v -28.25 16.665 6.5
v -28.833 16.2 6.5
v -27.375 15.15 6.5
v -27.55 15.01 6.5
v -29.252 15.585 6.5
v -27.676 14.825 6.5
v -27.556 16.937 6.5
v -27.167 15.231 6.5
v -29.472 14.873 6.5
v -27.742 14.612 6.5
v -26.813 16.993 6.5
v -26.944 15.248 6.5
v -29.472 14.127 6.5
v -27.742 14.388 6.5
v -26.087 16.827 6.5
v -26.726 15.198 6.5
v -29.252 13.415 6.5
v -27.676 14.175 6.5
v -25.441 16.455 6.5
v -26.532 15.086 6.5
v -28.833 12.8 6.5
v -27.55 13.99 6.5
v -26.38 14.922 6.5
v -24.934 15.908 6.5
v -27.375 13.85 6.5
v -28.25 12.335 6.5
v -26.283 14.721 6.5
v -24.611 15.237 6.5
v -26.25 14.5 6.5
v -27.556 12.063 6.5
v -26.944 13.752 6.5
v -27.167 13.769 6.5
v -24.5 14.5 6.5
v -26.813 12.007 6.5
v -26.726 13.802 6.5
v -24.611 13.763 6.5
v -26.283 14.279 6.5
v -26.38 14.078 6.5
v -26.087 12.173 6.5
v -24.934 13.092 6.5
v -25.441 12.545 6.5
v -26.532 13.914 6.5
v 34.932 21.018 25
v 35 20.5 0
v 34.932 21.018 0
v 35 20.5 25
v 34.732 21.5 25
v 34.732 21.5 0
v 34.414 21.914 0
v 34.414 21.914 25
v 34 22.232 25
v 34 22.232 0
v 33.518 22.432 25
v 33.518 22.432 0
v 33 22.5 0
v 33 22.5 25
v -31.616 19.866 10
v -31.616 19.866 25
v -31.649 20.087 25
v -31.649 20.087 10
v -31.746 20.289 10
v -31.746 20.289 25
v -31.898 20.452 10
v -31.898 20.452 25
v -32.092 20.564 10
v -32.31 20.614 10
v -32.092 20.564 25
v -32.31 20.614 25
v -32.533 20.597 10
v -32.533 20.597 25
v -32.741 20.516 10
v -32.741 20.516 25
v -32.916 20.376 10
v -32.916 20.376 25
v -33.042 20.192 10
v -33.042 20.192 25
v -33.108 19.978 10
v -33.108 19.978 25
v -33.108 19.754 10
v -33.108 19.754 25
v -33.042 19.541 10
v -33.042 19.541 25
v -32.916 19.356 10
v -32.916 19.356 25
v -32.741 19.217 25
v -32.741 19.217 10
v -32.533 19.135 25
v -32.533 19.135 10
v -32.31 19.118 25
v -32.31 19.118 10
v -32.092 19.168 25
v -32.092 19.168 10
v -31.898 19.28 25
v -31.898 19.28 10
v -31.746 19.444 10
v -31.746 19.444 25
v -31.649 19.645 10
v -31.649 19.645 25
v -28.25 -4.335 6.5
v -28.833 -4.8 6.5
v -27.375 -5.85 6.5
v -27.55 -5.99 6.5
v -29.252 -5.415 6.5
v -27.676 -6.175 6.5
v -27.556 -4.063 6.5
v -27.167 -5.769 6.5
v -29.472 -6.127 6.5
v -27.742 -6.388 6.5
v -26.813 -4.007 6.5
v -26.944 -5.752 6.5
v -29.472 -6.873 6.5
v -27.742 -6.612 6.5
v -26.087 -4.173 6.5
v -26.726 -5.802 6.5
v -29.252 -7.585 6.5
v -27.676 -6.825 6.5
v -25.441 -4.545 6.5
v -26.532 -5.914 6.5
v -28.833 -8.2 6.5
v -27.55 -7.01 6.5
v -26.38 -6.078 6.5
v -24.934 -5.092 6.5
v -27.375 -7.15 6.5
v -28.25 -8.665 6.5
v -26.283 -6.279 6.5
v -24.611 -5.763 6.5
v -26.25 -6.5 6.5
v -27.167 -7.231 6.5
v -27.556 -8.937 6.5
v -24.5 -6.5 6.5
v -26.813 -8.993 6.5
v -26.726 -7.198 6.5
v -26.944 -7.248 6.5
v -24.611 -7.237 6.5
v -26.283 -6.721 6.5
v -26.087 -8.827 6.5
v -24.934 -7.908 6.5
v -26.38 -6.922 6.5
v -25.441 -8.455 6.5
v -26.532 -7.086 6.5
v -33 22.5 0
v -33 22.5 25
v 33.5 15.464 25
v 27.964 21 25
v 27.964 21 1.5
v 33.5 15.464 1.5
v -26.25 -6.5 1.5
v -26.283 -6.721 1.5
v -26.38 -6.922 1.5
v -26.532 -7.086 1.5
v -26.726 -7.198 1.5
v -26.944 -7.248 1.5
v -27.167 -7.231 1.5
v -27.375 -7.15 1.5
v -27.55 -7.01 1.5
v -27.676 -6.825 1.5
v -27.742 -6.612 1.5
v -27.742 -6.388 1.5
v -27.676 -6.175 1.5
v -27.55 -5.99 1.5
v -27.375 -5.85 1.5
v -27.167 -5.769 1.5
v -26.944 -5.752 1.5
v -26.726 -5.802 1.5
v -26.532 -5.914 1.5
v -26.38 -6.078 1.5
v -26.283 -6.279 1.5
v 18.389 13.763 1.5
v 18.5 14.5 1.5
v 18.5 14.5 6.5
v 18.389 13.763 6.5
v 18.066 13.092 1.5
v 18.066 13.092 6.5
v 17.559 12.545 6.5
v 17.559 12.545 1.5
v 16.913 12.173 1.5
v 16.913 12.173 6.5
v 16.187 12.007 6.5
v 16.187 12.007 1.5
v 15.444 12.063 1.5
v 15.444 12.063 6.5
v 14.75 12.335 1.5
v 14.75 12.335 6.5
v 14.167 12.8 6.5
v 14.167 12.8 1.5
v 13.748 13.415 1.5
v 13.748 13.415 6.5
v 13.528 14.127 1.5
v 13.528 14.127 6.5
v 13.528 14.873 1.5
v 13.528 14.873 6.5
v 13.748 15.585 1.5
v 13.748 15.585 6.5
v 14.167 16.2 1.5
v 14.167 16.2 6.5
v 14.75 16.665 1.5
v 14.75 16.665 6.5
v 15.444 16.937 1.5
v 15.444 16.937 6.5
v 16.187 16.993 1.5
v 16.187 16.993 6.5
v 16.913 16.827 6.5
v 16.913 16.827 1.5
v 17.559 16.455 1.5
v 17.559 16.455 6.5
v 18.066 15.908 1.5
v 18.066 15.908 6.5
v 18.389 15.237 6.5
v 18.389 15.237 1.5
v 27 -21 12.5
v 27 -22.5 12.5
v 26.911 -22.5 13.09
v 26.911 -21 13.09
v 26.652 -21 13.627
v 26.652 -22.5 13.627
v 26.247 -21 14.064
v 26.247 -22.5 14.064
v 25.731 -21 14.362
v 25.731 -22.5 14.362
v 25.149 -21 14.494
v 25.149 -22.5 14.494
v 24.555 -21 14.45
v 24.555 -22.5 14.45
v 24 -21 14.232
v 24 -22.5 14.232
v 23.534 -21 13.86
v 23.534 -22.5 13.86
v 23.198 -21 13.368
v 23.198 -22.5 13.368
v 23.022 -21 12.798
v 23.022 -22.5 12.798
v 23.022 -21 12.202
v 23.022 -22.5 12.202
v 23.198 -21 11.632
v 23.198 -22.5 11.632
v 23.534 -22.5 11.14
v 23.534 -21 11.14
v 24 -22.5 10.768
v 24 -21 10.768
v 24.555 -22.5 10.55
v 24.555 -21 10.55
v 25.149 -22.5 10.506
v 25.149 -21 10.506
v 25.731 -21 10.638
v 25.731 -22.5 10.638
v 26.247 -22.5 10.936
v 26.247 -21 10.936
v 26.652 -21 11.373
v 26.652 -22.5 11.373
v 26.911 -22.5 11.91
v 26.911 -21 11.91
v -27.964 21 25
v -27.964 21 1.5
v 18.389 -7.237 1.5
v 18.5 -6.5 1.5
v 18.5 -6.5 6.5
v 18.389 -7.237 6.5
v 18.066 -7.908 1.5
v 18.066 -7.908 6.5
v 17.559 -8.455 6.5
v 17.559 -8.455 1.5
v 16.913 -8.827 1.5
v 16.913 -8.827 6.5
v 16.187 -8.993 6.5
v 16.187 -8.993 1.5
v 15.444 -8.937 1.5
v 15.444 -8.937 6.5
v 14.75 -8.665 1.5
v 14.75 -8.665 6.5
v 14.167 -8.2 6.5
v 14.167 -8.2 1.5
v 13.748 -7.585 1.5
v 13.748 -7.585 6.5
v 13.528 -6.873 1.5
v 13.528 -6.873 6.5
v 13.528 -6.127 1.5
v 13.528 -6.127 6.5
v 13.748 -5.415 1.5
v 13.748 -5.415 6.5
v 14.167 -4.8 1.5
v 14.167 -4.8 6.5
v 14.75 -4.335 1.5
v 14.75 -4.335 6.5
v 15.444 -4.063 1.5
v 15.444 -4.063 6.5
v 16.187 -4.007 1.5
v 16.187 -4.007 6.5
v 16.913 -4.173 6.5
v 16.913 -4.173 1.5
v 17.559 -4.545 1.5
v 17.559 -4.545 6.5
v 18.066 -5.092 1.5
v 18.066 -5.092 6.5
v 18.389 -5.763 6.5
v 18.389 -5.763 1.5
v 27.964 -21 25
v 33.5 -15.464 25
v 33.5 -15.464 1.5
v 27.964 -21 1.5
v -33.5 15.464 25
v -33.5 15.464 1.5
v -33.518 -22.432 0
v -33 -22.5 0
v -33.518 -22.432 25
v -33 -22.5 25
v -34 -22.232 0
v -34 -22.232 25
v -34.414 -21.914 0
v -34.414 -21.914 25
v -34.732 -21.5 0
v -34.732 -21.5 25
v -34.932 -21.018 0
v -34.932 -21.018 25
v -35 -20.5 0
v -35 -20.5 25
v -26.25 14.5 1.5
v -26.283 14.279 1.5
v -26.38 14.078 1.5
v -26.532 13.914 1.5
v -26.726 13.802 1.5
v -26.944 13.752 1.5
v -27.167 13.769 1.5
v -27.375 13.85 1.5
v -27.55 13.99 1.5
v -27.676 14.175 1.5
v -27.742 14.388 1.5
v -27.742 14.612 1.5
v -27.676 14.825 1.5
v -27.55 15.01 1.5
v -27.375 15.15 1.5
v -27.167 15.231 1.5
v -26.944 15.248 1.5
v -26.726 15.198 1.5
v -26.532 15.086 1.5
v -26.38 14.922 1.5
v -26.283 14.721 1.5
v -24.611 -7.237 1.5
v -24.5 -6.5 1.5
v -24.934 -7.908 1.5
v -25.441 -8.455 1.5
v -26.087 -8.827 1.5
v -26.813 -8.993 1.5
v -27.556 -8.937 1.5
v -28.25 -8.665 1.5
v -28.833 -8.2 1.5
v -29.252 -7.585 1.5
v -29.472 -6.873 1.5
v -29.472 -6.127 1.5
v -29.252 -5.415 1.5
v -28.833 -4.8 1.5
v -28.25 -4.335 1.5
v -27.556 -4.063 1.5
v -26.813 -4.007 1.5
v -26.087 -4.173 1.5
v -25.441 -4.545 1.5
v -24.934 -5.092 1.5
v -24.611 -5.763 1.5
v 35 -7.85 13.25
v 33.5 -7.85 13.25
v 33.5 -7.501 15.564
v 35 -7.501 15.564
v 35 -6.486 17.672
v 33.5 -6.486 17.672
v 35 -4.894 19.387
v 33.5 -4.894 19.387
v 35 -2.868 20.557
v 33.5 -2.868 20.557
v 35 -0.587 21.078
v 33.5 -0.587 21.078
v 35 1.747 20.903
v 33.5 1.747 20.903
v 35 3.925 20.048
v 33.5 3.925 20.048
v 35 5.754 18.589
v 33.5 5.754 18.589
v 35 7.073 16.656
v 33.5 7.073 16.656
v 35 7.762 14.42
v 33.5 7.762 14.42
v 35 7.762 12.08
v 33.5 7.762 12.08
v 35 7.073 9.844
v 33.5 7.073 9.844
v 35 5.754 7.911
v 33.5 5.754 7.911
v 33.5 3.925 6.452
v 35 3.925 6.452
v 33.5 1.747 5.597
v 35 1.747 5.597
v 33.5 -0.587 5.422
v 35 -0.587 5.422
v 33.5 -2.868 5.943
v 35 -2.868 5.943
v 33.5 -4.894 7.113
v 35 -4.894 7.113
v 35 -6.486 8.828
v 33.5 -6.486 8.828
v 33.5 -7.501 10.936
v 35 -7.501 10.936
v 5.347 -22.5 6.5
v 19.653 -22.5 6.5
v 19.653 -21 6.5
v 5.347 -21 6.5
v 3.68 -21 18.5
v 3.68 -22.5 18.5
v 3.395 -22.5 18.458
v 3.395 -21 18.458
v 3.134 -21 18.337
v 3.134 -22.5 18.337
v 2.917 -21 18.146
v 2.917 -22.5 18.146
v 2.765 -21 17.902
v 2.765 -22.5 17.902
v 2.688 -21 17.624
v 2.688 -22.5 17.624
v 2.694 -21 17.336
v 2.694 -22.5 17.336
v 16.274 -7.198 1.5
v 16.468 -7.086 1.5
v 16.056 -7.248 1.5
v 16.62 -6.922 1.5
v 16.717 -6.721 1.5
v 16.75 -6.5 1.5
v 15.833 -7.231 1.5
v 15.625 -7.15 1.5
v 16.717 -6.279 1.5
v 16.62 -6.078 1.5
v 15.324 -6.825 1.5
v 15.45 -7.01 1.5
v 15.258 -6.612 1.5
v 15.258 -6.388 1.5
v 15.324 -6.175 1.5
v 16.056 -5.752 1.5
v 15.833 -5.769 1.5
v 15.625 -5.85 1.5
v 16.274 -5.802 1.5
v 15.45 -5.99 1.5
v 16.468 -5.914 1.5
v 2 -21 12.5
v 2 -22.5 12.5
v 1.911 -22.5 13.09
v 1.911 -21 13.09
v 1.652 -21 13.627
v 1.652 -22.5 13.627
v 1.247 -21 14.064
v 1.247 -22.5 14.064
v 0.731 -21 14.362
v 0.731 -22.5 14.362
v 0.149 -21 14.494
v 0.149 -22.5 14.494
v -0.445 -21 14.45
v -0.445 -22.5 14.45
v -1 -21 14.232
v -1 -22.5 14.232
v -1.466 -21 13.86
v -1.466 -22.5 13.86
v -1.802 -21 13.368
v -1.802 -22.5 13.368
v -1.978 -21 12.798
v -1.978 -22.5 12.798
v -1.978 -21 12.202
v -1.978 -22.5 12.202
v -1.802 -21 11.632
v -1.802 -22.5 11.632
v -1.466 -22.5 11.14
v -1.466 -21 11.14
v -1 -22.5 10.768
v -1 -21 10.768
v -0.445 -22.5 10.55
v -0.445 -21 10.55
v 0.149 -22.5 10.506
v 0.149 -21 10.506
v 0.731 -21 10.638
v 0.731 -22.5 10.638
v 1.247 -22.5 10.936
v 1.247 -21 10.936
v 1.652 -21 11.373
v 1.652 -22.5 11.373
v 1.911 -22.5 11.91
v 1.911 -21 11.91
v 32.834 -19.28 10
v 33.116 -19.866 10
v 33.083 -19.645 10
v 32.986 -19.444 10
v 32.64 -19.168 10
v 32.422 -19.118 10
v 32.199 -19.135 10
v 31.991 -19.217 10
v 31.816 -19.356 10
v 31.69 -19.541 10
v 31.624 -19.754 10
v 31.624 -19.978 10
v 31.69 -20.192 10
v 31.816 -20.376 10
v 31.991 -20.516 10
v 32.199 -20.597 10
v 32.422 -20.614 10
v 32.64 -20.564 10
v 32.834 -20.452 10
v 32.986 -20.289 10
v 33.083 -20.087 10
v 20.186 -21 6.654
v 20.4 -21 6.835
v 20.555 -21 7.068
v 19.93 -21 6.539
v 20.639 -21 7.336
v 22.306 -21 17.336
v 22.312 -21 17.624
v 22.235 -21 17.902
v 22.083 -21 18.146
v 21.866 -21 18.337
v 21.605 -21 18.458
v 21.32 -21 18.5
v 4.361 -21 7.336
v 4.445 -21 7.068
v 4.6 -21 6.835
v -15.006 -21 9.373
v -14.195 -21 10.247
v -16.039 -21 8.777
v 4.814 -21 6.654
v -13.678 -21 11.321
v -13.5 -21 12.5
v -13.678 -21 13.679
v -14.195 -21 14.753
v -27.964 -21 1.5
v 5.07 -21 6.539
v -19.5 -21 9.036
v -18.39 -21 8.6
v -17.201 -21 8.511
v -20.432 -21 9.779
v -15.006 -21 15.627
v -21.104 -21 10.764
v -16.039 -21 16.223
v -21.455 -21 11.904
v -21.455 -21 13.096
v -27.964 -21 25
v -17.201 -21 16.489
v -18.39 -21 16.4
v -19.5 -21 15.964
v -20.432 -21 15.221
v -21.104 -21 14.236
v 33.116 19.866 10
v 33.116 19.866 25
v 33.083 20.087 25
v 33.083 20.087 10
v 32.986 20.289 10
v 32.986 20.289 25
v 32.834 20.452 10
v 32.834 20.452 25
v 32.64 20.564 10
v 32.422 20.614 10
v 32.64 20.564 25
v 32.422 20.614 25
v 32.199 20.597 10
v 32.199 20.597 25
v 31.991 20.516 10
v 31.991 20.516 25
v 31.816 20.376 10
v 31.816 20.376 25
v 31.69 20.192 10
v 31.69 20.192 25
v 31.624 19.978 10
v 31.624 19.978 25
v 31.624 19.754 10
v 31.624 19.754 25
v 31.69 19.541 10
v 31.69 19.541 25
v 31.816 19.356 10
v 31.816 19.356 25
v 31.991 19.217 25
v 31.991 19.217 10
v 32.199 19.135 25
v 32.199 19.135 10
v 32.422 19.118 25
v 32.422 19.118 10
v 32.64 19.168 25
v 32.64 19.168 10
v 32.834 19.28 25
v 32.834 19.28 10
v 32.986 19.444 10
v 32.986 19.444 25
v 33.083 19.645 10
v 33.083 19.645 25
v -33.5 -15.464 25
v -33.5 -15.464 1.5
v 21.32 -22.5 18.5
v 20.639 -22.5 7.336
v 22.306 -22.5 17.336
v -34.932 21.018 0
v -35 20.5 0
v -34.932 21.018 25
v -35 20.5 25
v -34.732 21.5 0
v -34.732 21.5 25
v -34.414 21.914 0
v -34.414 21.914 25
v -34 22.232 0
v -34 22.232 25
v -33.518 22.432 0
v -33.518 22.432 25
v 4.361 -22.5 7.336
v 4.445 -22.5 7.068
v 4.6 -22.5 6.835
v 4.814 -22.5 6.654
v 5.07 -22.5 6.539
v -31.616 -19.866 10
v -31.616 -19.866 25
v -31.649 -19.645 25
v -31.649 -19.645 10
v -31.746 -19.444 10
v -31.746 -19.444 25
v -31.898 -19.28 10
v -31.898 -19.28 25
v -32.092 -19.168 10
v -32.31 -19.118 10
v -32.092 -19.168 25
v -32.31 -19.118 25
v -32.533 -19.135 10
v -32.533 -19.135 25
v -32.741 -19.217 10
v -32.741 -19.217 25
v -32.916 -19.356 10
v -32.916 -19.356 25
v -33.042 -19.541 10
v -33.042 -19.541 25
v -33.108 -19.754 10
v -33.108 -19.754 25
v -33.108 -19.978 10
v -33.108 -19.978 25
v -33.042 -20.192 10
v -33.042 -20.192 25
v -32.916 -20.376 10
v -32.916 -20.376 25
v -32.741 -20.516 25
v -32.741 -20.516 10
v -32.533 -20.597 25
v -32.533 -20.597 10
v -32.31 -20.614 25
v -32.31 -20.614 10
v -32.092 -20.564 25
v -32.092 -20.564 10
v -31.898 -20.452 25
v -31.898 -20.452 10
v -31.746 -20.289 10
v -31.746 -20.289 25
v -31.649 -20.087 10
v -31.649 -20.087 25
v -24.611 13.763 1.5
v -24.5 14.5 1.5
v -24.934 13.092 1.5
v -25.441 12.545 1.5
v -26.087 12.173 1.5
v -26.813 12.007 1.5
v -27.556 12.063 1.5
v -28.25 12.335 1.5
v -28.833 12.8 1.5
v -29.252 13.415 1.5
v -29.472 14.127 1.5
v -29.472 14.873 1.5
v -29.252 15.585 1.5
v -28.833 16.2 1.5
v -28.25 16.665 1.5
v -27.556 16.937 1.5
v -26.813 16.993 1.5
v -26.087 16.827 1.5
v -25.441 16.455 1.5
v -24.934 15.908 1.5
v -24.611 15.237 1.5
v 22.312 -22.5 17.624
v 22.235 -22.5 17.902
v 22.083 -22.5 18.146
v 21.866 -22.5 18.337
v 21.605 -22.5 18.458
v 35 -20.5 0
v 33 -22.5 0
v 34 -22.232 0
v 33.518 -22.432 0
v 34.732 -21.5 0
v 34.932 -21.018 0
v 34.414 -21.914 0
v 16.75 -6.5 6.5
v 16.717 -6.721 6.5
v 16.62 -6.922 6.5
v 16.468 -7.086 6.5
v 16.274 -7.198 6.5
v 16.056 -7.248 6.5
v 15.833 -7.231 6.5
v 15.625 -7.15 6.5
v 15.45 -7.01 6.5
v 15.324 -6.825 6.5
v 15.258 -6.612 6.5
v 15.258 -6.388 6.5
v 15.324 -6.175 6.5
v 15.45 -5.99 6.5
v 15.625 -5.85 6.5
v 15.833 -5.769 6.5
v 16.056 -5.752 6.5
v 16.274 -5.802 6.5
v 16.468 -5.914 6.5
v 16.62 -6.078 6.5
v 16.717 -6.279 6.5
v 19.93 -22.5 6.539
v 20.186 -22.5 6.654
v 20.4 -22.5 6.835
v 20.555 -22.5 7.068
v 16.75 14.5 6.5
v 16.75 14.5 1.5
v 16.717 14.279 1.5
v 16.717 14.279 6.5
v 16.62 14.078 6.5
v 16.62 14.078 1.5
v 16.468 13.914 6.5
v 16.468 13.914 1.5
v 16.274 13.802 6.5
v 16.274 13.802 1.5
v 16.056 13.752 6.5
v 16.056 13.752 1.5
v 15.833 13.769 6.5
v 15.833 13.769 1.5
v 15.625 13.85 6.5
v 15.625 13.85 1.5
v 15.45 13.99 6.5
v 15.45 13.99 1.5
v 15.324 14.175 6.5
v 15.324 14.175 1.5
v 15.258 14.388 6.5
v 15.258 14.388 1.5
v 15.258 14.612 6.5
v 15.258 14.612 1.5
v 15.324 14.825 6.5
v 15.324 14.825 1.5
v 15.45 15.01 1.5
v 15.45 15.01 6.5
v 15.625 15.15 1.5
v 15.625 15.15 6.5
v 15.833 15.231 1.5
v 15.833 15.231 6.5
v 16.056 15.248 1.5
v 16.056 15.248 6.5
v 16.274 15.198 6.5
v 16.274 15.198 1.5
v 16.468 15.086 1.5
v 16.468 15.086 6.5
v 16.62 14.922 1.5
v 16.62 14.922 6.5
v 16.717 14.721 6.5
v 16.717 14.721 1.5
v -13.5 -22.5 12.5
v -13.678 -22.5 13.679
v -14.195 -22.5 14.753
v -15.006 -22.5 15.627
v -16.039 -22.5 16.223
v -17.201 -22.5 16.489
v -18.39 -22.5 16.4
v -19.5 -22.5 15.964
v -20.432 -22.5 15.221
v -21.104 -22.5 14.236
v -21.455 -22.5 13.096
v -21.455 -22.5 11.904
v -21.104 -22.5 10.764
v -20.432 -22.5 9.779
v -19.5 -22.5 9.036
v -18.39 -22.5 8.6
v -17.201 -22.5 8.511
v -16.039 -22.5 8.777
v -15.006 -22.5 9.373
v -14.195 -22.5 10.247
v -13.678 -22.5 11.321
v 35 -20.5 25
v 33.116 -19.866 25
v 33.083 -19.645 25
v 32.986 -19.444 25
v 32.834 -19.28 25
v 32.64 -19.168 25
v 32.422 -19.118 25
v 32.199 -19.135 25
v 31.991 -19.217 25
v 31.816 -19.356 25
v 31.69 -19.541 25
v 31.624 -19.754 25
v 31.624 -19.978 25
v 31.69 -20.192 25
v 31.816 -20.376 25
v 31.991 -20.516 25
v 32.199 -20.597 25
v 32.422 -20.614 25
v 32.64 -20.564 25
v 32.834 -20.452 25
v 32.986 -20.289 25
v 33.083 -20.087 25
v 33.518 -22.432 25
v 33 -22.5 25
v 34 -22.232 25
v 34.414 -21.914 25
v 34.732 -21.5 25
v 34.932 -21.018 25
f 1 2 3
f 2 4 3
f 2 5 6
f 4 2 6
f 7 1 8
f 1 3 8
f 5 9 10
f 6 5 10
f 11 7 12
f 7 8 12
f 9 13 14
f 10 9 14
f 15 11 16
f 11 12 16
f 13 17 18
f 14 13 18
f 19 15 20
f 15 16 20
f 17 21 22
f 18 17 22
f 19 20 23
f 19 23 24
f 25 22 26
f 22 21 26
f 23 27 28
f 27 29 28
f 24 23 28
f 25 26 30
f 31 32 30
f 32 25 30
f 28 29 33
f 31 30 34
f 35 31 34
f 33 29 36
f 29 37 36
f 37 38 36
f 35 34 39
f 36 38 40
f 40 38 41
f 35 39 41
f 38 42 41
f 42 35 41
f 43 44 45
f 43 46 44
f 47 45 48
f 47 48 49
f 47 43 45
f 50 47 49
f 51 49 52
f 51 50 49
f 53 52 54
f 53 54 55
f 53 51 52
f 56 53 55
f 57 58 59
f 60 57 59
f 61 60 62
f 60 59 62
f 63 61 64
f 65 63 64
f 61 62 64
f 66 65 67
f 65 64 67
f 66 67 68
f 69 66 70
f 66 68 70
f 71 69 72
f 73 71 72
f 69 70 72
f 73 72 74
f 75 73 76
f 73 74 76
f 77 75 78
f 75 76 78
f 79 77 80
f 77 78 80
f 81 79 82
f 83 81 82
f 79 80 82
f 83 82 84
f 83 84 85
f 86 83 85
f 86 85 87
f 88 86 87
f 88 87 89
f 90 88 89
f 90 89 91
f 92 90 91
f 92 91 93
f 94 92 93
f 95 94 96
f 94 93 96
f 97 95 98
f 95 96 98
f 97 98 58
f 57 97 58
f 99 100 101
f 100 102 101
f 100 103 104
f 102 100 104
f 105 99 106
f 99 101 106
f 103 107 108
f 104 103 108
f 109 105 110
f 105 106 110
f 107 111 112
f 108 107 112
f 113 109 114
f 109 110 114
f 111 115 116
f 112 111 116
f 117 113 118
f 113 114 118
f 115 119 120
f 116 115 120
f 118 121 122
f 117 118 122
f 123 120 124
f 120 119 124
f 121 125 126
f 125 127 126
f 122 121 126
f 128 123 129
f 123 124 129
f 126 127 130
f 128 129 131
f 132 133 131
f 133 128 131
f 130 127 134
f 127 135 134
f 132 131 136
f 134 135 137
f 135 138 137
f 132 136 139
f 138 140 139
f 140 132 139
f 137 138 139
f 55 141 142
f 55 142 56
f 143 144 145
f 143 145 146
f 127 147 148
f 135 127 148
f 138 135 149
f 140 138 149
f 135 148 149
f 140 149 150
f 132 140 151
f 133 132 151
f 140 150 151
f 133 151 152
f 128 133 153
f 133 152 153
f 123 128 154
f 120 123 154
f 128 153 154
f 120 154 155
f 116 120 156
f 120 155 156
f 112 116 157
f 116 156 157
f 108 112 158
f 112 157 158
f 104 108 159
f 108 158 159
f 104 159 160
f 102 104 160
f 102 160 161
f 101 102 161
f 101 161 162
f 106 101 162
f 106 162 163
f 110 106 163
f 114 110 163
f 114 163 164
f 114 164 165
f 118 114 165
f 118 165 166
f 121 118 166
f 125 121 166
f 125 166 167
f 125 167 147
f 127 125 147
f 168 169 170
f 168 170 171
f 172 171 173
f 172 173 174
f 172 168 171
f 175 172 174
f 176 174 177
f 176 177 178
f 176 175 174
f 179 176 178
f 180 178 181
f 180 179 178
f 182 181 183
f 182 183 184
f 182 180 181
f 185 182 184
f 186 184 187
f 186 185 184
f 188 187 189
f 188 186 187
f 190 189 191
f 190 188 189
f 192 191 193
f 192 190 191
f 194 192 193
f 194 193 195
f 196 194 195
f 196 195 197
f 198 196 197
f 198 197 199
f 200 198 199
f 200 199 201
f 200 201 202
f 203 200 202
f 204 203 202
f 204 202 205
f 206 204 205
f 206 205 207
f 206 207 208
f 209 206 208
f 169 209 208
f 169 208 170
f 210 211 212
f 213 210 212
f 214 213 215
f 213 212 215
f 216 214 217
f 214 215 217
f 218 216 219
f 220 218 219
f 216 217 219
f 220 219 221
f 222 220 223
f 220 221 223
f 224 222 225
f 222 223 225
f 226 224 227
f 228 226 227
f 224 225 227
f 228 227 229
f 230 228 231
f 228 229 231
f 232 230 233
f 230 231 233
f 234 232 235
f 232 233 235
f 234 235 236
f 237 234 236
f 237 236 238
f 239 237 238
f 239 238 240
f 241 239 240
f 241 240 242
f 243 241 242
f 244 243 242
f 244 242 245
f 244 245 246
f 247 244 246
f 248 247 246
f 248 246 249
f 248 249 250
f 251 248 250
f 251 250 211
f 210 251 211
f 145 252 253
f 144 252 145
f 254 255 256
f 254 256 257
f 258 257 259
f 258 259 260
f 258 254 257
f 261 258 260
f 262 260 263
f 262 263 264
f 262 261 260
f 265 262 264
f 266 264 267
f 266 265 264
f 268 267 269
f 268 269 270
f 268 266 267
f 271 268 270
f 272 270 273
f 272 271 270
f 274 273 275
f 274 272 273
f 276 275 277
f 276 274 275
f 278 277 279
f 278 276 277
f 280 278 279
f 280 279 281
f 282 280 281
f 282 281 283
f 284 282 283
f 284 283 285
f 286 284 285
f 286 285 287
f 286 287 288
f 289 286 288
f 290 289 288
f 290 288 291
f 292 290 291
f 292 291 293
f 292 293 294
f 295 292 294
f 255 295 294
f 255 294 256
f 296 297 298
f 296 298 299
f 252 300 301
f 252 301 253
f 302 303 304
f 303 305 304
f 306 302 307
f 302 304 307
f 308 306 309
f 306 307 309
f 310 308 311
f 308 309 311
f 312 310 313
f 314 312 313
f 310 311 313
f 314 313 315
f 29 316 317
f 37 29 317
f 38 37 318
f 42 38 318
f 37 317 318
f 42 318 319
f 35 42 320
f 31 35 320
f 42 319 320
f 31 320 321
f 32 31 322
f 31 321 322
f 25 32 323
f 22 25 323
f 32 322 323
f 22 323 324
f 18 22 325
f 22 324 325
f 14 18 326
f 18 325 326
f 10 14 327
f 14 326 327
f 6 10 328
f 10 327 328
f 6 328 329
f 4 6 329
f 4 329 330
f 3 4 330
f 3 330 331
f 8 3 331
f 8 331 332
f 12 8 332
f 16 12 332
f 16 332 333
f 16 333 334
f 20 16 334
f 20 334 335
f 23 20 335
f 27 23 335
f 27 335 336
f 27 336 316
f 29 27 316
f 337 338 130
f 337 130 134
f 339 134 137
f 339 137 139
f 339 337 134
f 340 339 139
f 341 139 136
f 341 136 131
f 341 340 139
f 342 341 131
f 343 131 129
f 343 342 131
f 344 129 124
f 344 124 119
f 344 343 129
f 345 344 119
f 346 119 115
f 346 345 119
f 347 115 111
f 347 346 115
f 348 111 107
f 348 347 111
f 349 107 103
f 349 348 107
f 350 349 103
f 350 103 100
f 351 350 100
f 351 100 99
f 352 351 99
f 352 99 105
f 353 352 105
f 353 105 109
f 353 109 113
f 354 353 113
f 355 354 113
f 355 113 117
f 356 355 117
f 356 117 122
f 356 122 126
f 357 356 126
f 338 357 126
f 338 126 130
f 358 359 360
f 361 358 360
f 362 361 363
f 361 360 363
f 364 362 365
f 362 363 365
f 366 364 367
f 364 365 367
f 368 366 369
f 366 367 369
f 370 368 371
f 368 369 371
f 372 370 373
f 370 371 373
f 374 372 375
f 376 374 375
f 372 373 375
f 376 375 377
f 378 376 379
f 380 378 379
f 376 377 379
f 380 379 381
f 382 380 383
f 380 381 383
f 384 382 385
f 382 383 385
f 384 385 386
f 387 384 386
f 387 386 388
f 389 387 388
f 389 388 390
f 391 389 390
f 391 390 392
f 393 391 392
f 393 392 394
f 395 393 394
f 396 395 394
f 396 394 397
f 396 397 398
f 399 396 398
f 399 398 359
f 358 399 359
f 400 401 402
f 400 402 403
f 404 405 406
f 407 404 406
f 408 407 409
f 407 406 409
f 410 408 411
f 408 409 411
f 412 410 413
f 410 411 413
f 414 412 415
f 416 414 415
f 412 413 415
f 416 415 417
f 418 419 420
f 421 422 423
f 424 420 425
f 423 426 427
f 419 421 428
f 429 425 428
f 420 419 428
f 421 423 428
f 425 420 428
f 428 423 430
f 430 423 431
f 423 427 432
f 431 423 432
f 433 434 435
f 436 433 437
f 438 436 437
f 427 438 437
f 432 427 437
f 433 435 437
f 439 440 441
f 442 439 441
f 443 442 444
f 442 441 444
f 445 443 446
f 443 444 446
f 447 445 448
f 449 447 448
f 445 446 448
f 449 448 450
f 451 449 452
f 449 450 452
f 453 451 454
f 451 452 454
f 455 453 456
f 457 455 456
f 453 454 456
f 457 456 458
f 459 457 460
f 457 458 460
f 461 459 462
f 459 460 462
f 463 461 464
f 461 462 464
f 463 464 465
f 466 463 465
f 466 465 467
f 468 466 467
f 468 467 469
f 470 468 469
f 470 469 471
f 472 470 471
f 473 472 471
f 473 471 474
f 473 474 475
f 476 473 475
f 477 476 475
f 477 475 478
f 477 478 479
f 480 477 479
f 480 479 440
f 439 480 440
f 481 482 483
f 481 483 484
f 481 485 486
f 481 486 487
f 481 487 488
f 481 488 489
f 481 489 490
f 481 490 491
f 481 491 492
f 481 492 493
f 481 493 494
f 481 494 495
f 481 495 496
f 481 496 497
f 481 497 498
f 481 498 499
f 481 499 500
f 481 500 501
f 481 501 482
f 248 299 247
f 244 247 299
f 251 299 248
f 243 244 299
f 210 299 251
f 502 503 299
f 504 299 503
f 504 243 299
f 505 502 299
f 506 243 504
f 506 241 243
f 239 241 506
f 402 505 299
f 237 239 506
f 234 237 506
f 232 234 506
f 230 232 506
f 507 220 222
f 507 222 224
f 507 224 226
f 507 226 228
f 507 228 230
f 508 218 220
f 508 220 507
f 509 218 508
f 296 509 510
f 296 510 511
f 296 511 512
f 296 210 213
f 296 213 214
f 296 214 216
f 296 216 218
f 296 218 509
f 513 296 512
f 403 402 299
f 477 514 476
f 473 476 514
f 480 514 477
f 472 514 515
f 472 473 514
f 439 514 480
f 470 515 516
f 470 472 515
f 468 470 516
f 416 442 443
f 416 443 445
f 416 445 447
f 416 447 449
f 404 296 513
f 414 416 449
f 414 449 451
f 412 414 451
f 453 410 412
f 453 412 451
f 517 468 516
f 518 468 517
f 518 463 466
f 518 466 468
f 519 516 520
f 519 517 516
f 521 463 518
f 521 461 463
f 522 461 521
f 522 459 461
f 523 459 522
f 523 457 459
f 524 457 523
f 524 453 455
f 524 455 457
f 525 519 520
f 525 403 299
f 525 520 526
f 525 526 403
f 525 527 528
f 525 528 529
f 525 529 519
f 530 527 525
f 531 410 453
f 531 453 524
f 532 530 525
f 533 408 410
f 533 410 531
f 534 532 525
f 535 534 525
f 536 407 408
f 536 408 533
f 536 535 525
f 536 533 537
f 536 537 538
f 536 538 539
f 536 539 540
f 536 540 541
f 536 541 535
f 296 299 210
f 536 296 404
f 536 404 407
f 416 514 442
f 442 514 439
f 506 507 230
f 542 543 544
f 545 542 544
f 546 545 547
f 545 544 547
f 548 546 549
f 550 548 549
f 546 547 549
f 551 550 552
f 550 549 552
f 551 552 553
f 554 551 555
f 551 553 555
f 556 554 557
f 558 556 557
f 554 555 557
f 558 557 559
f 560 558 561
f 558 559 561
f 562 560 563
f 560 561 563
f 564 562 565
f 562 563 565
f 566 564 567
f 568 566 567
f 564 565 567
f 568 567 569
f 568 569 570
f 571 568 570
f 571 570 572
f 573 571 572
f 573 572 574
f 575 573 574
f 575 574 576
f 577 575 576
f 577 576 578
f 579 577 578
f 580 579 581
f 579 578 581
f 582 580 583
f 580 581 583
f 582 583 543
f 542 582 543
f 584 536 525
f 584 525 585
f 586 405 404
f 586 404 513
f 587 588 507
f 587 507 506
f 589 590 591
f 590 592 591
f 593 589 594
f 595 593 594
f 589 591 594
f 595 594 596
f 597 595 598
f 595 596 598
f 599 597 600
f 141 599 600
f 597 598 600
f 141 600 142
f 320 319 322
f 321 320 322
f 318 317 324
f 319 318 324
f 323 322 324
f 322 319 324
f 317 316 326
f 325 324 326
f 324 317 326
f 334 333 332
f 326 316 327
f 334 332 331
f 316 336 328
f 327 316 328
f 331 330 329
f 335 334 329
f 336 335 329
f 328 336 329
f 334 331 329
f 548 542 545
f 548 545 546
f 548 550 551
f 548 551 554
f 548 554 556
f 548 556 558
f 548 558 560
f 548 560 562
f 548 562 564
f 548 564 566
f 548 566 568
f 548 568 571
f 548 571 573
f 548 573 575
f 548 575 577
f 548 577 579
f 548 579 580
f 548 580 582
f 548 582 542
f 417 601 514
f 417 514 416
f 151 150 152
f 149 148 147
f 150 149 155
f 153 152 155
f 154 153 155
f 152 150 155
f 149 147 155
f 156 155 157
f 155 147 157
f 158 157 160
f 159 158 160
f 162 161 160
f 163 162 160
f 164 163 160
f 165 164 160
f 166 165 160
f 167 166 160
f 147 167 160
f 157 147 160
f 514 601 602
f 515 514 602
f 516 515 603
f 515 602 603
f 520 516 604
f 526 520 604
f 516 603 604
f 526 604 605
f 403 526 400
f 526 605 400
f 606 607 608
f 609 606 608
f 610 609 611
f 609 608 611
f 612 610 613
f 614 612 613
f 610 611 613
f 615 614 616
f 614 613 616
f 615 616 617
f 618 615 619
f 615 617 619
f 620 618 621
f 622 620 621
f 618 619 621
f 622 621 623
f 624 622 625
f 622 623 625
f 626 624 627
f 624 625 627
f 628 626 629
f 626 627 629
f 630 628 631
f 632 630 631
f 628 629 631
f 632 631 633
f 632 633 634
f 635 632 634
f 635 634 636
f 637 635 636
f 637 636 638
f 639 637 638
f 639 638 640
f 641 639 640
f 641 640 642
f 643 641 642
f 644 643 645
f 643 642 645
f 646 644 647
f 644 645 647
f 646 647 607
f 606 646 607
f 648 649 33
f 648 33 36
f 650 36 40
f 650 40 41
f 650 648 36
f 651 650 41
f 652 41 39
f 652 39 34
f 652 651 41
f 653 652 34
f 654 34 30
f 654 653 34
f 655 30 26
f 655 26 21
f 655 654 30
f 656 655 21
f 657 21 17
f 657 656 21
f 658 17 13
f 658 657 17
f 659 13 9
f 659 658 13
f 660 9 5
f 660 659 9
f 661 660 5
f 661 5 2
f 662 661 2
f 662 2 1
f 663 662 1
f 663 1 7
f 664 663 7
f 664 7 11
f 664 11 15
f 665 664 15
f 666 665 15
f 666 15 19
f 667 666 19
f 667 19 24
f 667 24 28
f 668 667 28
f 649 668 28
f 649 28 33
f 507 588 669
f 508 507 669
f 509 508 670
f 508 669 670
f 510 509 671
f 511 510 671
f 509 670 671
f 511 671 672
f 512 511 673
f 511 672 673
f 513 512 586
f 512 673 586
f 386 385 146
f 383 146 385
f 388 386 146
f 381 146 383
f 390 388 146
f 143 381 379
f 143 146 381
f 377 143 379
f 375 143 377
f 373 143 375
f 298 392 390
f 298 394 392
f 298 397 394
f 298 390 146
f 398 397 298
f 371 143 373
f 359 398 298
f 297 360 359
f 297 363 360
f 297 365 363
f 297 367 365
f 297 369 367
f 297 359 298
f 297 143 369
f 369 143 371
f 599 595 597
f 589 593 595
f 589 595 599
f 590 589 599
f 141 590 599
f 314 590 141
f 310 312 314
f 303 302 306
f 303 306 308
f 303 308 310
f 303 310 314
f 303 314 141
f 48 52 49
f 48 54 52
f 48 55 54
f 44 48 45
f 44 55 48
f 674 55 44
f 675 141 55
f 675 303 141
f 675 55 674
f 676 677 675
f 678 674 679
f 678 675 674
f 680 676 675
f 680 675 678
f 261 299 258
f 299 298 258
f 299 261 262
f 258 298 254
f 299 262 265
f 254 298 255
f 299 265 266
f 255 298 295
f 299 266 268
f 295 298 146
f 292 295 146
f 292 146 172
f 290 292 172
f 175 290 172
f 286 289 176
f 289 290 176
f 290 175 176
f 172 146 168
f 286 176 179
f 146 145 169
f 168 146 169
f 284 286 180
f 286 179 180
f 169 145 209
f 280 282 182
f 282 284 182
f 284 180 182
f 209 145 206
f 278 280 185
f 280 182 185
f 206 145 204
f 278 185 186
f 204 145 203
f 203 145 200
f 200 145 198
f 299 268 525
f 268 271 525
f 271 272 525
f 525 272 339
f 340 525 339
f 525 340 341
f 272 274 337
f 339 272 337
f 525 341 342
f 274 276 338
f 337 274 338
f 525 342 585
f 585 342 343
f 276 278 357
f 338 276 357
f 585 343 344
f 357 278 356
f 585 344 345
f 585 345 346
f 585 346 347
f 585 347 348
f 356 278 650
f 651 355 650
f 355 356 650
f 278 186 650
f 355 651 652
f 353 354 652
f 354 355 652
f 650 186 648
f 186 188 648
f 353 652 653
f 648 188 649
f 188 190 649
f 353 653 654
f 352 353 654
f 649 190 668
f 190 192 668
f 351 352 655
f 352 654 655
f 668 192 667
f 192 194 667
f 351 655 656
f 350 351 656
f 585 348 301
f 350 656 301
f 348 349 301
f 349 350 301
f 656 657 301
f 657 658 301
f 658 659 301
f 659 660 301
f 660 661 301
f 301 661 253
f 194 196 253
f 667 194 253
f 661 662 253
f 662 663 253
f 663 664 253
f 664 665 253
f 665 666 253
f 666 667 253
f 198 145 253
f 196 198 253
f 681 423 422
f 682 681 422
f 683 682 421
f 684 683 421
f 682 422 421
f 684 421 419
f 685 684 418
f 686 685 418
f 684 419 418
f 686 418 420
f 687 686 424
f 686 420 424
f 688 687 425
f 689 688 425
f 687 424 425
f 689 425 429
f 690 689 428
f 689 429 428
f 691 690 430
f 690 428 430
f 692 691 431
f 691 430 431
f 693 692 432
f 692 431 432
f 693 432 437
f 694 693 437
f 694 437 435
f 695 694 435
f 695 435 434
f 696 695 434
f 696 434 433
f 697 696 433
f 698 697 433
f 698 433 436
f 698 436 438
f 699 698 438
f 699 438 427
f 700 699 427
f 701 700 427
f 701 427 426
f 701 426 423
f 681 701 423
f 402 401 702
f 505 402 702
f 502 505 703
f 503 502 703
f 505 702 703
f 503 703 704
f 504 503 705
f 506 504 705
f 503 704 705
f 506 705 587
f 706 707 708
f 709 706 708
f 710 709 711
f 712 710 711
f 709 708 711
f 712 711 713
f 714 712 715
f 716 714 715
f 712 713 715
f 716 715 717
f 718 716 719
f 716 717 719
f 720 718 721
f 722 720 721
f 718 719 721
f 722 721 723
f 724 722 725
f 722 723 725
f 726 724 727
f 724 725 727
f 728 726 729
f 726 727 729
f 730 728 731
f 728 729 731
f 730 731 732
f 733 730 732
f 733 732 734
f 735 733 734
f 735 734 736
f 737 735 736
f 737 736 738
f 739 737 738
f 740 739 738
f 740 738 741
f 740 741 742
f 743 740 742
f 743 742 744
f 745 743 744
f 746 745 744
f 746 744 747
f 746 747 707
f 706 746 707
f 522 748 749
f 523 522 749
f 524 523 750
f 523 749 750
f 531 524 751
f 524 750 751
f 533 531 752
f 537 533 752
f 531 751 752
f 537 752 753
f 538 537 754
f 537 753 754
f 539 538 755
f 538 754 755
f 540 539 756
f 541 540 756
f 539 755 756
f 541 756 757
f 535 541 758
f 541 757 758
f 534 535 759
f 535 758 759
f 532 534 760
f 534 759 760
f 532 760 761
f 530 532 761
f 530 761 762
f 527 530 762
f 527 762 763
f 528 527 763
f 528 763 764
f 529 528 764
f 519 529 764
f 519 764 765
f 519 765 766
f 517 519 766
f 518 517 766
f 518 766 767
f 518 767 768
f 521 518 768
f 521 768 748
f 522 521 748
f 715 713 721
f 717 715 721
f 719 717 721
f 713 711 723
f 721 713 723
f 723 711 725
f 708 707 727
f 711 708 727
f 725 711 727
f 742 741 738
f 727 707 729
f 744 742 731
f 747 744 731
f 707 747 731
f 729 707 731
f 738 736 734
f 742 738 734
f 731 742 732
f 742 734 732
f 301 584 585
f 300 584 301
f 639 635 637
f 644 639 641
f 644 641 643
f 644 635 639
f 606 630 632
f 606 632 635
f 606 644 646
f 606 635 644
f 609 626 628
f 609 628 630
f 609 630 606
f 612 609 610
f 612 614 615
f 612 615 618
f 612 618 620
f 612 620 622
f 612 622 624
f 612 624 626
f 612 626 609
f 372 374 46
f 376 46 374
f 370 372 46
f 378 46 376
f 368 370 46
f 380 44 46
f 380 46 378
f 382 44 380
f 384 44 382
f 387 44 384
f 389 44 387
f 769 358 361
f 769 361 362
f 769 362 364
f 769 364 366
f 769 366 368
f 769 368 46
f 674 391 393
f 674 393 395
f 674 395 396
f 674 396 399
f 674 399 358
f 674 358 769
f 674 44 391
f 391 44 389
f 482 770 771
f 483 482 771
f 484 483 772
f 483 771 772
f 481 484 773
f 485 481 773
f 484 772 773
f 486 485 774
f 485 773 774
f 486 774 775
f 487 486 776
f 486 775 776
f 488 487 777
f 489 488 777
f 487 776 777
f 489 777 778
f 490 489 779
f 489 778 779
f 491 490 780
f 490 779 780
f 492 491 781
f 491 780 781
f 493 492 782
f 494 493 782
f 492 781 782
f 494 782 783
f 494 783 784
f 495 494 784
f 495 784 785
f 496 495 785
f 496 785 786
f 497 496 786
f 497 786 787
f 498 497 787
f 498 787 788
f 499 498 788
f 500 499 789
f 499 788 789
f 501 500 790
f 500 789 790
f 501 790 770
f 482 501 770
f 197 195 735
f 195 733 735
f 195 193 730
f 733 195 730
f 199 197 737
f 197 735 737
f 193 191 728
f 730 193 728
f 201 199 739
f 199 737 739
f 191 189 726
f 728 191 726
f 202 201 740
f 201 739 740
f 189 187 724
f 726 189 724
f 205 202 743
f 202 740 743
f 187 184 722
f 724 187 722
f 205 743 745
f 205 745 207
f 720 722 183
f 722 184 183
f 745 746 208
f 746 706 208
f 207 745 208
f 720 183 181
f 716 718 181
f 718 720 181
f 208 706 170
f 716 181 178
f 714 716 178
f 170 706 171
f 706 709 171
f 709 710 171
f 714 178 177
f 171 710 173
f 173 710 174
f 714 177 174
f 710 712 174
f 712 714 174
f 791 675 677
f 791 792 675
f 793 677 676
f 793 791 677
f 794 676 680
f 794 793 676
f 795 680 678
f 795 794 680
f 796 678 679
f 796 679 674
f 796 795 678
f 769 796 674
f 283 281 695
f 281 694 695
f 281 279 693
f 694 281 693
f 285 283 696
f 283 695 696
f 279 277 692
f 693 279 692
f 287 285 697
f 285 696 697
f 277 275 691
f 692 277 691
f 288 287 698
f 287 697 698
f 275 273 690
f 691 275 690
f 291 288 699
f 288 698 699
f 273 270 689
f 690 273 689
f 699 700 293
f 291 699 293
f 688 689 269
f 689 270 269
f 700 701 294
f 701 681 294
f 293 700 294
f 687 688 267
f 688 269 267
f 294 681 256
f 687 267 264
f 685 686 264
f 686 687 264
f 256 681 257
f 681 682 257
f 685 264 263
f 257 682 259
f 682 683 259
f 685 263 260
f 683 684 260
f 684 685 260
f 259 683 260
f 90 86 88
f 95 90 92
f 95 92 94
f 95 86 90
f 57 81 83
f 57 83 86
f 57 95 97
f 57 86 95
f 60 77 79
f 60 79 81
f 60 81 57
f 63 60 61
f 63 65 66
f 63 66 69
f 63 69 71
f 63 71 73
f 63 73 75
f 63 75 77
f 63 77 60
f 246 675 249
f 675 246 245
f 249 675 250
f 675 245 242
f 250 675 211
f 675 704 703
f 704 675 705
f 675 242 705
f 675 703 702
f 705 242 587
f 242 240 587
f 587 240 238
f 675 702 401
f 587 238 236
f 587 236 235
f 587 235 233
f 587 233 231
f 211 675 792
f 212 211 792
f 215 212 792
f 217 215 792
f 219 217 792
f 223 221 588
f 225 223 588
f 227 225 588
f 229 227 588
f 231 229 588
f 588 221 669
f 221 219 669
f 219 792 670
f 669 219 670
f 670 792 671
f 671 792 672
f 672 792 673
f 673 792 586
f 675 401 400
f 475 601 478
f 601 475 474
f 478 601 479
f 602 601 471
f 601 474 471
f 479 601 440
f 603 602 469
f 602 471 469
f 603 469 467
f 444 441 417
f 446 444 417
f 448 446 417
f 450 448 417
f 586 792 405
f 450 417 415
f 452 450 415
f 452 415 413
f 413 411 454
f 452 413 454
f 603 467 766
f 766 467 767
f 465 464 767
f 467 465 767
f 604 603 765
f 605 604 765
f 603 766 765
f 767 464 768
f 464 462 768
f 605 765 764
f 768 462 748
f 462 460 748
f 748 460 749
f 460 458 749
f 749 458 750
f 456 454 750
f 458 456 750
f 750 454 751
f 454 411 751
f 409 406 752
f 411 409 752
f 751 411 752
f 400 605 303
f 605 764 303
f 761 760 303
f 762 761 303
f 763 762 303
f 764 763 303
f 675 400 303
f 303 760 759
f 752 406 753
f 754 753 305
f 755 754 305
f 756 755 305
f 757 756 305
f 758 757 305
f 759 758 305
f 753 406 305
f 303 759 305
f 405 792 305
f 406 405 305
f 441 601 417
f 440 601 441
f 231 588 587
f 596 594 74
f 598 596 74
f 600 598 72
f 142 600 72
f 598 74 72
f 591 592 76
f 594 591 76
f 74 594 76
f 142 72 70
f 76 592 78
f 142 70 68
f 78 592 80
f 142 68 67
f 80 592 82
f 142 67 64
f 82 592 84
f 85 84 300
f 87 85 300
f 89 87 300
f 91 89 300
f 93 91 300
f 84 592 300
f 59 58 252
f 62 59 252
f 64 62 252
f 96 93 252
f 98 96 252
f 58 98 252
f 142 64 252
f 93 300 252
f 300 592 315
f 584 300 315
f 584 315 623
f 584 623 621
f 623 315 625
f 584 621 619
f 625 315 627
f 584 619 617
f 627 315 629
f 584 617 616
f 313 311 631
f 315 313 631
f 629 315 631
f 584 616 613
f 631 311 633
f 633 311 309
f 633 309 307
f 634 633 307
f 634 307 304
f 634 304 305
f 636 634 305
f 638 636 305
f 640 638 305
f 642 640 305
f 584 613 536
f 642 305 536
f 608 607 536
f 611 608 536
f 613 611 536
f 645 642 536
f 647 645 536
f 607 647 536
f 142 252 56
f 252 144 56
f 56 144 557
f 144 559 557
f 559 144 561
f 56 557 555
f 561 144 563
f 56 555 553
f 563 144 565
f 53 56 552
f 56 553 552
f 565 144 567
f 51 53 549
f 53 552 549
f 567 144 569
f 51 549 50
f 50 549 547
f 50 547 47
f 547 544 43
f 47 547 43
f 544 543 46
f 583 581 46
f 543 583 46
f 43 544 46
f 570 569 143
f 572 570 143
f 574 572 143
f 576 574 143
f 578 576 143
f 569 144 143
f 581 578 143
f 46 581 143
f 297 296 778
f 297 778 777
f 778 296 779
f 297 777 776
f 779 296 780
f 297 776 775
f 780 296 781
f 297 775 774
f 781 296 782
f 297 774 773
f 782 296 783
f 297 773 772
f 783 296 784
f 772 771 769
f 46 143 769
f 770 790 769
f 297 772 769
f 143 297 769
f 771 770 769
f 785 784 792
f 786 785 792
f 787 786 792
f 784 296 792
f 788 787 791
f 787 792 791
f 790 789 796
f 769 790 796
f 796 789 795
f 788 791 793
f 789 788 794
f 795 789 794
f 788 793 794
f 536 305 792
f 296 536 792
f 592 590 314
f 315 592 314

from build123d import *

# Parameters (mm, degrees)
SKETCH006_W     = 70
SKETCH006_H     = 45
PAD004_DEPTH    = 25
POCKET002_DEPTH = 23.5
SKETCH008_R     = 2.5
SKETCH008_R_2   = 0.75
PAD005_DEPTH    = 6.5
SKETCH009_R     = 7.85
POCKET003_DEPTH = 5
SKETCH010_R     = 4
SKETCH010_R_2   = 2
POCKET004_DEPTH = 5
PAD006_DEPTH    = 1.5
FILLET_R        = 2
SKETCH012_R     = 0.75
POCKET005_DEPTH = 15


with BuildPart() as part:
    # Sketch006 (on Face1 of ReferencePocket) → Pad004 (new body)
    with BuildSketch(Plane(origin=(0, 0, 0), x_dir=(1, 0, 0), z_dir=(0, 0, -1))):
        Rectangle(SKETCH006_W, SKETCH006_H)
    extrude(amount=-PAD004_DEPTH)

    # Sketch007 (on Face6 of Pad004) → Pocket002 (cut)
    with BuildSketch(Plane.XY.offset(25)):
        Polygon((-33.5, -15.4644660941), (-33.5, 15.4644660941), (-27.9644660941, 21), (27.9644660941, 21), (33.5, 15.4644660941), (33.5, -15.4644660941), (27.9644660941, -21), (-27.9644660941, -21), align=None)
    extrude(amount=-POCKET002_DEPTH, mode=Mode.SUBTRACT)

    # Sketch008 (on Face1 of ReferencePocket) → Pad005 (join)
    with BuildSketch(Plane(origin=(0, 0, 0), x_dir=(1, 0, 0), z_dir=(0, 0, -1))):
        with Locations((-27, 6.5)):
            Circle(SKETCH008_R)
        with Locations((-27, 6.5)):
            Circle(SKETCH008_R_2, mode=Mode.SUBTRACT)
        with Locations((16, 6.5)):
            Circle(SKETCH008_R)
        with Locations((16, 6.5)):
            Circle(SKETCH008_R_2, mode=Mode.SUBTRACT)
        with Locations((16, -14.5)):
            Circle(SKETCH008_R)
        with Locations((16, -14.5)):
            Circle(SKETCH008_R_2, mode=Mode.SUBTRACT)
        with Locations((-27, -14.5)):
            Circle(SKETCH008_R)
        with Locations((-27, -14.5)):
            Circle(SKETCH008_R_2, mode=Mode.SUBTRACT)
    extrude(amount=-PAD005_DEPTH)

    # Sketch009 (on Face14 of Pad005) → Pocket003 (cut)
    with BuildSketch(Plane(origin=(33.5, 0, 0), x_dir=(0, -1, 0), z_dir=(-1, 0, 0))):
        with Locations((0, 13.25)):
            Circle(SKETCH009_R)
    extrude(amount=-POCKET003_DEPTH, mode=Mode.SUBTRACT)

    # Sketch010 (on Face1 of Pocket003) → Pocket004 (cut)
    with BuildSketch(Plane.XZ.offset(22.5)):
        with Locations((-17.5, 12.5)):
            Circle(SKETCH010_R)
        with Locations((0, 12.5)):
            Circle(SKETCH010_R_2)
        with Locations((25, 12.5)):
            Circle(SKETCH010_R_2)
        Polygon((2.5, 18.5), (22.5, 18.5), (20.5, 6.5), (4.5, 6.5), align=None)
    extrude(amount=-POCKET004_DEPTH, mode=Mode.SUBTRACT)

    # Sketch011 (on Face1 of Pocket004) → Pad006 (join)
    with BuildSketch(Plane.XZ.offset(22.5)):
        with BuildLine():
            ThreePointArc((22.3059335071, 17.3356010429), (22.0825595608, 18.1463748961), (21.3195396089, 18.5))
            Line((21.3195396089, 18.5), (22.5, 18.5))
            Line((22.5, 18.5), (22.3059335071, 17.3356010429))
        make_face()
        with BuildLine():
            ThreePointArc((3.6804604217, 18.5), (2.9174404392, 18.1463748961), (2.6940664979, 17.3356010127))
            Line((2.5, 18.5), (2.6940664979, 17.3356010127))
            Line((3.6804604217, 18.5), (2.5, 18.5))
        make_face()
        with BuildLine():
            ThreePointArc((4.3607346062, 7.3355923631), (4.7007521923, 6.7369800175), (5.3471183194, 6.5))
            Line((4.5, 6.5), (5.3471183194, 6.5))
            Line((4.3607346062, 7.3355923631), (4.5, 6.5))
        make_face()
        with BuildLine():
            ThreePointArc((19.6528729116, 6.5), (20.2992478077, 6.7369800175), (20.6392668354, 7.3356010127))
            Line((20.6392668354, 7.3356010127), (20.5, 6.5))
            Line((20.5, 6.5), (19.6528729116, 6.5))
        make_face()
    extrude(amount=-PAD006_DEPTH)

    # Fillet
    fillet_edges = [part.edges().sort_by_distance(p)[0] for p in [
        (35, -22.5, 12.5),
        (-35, -22.5, 12.5),
        (35, 22.5, 12.5),
        (-35, 22.5, 12.5),
    ]]
    fillet(fillet_edges, radius=FILLET_R)

    # Sketch012 (on Face5 of Fillet) → Pocket005 (cut)
    with BuildSketch(Plane.XY.offset(25)):
        with Locations((-32.3661165235, 19.8661165235)):
            Circle(SKETCH012_R)
        with Locations((32.3661165235, 19.8661165235)):
            Circle(SKETCH012_R)
        with Locations((32.3661165235, -19.8661165235)):
            Circle(SKETCH012_R)
        with Locations((-32.3661165235, -19.8661165235)):
            Circle(SKETCH012_R)
    extrude(amount=-POCKET005_DEPTH, mode=Mode.SUBTRACT)


solid = part.part
